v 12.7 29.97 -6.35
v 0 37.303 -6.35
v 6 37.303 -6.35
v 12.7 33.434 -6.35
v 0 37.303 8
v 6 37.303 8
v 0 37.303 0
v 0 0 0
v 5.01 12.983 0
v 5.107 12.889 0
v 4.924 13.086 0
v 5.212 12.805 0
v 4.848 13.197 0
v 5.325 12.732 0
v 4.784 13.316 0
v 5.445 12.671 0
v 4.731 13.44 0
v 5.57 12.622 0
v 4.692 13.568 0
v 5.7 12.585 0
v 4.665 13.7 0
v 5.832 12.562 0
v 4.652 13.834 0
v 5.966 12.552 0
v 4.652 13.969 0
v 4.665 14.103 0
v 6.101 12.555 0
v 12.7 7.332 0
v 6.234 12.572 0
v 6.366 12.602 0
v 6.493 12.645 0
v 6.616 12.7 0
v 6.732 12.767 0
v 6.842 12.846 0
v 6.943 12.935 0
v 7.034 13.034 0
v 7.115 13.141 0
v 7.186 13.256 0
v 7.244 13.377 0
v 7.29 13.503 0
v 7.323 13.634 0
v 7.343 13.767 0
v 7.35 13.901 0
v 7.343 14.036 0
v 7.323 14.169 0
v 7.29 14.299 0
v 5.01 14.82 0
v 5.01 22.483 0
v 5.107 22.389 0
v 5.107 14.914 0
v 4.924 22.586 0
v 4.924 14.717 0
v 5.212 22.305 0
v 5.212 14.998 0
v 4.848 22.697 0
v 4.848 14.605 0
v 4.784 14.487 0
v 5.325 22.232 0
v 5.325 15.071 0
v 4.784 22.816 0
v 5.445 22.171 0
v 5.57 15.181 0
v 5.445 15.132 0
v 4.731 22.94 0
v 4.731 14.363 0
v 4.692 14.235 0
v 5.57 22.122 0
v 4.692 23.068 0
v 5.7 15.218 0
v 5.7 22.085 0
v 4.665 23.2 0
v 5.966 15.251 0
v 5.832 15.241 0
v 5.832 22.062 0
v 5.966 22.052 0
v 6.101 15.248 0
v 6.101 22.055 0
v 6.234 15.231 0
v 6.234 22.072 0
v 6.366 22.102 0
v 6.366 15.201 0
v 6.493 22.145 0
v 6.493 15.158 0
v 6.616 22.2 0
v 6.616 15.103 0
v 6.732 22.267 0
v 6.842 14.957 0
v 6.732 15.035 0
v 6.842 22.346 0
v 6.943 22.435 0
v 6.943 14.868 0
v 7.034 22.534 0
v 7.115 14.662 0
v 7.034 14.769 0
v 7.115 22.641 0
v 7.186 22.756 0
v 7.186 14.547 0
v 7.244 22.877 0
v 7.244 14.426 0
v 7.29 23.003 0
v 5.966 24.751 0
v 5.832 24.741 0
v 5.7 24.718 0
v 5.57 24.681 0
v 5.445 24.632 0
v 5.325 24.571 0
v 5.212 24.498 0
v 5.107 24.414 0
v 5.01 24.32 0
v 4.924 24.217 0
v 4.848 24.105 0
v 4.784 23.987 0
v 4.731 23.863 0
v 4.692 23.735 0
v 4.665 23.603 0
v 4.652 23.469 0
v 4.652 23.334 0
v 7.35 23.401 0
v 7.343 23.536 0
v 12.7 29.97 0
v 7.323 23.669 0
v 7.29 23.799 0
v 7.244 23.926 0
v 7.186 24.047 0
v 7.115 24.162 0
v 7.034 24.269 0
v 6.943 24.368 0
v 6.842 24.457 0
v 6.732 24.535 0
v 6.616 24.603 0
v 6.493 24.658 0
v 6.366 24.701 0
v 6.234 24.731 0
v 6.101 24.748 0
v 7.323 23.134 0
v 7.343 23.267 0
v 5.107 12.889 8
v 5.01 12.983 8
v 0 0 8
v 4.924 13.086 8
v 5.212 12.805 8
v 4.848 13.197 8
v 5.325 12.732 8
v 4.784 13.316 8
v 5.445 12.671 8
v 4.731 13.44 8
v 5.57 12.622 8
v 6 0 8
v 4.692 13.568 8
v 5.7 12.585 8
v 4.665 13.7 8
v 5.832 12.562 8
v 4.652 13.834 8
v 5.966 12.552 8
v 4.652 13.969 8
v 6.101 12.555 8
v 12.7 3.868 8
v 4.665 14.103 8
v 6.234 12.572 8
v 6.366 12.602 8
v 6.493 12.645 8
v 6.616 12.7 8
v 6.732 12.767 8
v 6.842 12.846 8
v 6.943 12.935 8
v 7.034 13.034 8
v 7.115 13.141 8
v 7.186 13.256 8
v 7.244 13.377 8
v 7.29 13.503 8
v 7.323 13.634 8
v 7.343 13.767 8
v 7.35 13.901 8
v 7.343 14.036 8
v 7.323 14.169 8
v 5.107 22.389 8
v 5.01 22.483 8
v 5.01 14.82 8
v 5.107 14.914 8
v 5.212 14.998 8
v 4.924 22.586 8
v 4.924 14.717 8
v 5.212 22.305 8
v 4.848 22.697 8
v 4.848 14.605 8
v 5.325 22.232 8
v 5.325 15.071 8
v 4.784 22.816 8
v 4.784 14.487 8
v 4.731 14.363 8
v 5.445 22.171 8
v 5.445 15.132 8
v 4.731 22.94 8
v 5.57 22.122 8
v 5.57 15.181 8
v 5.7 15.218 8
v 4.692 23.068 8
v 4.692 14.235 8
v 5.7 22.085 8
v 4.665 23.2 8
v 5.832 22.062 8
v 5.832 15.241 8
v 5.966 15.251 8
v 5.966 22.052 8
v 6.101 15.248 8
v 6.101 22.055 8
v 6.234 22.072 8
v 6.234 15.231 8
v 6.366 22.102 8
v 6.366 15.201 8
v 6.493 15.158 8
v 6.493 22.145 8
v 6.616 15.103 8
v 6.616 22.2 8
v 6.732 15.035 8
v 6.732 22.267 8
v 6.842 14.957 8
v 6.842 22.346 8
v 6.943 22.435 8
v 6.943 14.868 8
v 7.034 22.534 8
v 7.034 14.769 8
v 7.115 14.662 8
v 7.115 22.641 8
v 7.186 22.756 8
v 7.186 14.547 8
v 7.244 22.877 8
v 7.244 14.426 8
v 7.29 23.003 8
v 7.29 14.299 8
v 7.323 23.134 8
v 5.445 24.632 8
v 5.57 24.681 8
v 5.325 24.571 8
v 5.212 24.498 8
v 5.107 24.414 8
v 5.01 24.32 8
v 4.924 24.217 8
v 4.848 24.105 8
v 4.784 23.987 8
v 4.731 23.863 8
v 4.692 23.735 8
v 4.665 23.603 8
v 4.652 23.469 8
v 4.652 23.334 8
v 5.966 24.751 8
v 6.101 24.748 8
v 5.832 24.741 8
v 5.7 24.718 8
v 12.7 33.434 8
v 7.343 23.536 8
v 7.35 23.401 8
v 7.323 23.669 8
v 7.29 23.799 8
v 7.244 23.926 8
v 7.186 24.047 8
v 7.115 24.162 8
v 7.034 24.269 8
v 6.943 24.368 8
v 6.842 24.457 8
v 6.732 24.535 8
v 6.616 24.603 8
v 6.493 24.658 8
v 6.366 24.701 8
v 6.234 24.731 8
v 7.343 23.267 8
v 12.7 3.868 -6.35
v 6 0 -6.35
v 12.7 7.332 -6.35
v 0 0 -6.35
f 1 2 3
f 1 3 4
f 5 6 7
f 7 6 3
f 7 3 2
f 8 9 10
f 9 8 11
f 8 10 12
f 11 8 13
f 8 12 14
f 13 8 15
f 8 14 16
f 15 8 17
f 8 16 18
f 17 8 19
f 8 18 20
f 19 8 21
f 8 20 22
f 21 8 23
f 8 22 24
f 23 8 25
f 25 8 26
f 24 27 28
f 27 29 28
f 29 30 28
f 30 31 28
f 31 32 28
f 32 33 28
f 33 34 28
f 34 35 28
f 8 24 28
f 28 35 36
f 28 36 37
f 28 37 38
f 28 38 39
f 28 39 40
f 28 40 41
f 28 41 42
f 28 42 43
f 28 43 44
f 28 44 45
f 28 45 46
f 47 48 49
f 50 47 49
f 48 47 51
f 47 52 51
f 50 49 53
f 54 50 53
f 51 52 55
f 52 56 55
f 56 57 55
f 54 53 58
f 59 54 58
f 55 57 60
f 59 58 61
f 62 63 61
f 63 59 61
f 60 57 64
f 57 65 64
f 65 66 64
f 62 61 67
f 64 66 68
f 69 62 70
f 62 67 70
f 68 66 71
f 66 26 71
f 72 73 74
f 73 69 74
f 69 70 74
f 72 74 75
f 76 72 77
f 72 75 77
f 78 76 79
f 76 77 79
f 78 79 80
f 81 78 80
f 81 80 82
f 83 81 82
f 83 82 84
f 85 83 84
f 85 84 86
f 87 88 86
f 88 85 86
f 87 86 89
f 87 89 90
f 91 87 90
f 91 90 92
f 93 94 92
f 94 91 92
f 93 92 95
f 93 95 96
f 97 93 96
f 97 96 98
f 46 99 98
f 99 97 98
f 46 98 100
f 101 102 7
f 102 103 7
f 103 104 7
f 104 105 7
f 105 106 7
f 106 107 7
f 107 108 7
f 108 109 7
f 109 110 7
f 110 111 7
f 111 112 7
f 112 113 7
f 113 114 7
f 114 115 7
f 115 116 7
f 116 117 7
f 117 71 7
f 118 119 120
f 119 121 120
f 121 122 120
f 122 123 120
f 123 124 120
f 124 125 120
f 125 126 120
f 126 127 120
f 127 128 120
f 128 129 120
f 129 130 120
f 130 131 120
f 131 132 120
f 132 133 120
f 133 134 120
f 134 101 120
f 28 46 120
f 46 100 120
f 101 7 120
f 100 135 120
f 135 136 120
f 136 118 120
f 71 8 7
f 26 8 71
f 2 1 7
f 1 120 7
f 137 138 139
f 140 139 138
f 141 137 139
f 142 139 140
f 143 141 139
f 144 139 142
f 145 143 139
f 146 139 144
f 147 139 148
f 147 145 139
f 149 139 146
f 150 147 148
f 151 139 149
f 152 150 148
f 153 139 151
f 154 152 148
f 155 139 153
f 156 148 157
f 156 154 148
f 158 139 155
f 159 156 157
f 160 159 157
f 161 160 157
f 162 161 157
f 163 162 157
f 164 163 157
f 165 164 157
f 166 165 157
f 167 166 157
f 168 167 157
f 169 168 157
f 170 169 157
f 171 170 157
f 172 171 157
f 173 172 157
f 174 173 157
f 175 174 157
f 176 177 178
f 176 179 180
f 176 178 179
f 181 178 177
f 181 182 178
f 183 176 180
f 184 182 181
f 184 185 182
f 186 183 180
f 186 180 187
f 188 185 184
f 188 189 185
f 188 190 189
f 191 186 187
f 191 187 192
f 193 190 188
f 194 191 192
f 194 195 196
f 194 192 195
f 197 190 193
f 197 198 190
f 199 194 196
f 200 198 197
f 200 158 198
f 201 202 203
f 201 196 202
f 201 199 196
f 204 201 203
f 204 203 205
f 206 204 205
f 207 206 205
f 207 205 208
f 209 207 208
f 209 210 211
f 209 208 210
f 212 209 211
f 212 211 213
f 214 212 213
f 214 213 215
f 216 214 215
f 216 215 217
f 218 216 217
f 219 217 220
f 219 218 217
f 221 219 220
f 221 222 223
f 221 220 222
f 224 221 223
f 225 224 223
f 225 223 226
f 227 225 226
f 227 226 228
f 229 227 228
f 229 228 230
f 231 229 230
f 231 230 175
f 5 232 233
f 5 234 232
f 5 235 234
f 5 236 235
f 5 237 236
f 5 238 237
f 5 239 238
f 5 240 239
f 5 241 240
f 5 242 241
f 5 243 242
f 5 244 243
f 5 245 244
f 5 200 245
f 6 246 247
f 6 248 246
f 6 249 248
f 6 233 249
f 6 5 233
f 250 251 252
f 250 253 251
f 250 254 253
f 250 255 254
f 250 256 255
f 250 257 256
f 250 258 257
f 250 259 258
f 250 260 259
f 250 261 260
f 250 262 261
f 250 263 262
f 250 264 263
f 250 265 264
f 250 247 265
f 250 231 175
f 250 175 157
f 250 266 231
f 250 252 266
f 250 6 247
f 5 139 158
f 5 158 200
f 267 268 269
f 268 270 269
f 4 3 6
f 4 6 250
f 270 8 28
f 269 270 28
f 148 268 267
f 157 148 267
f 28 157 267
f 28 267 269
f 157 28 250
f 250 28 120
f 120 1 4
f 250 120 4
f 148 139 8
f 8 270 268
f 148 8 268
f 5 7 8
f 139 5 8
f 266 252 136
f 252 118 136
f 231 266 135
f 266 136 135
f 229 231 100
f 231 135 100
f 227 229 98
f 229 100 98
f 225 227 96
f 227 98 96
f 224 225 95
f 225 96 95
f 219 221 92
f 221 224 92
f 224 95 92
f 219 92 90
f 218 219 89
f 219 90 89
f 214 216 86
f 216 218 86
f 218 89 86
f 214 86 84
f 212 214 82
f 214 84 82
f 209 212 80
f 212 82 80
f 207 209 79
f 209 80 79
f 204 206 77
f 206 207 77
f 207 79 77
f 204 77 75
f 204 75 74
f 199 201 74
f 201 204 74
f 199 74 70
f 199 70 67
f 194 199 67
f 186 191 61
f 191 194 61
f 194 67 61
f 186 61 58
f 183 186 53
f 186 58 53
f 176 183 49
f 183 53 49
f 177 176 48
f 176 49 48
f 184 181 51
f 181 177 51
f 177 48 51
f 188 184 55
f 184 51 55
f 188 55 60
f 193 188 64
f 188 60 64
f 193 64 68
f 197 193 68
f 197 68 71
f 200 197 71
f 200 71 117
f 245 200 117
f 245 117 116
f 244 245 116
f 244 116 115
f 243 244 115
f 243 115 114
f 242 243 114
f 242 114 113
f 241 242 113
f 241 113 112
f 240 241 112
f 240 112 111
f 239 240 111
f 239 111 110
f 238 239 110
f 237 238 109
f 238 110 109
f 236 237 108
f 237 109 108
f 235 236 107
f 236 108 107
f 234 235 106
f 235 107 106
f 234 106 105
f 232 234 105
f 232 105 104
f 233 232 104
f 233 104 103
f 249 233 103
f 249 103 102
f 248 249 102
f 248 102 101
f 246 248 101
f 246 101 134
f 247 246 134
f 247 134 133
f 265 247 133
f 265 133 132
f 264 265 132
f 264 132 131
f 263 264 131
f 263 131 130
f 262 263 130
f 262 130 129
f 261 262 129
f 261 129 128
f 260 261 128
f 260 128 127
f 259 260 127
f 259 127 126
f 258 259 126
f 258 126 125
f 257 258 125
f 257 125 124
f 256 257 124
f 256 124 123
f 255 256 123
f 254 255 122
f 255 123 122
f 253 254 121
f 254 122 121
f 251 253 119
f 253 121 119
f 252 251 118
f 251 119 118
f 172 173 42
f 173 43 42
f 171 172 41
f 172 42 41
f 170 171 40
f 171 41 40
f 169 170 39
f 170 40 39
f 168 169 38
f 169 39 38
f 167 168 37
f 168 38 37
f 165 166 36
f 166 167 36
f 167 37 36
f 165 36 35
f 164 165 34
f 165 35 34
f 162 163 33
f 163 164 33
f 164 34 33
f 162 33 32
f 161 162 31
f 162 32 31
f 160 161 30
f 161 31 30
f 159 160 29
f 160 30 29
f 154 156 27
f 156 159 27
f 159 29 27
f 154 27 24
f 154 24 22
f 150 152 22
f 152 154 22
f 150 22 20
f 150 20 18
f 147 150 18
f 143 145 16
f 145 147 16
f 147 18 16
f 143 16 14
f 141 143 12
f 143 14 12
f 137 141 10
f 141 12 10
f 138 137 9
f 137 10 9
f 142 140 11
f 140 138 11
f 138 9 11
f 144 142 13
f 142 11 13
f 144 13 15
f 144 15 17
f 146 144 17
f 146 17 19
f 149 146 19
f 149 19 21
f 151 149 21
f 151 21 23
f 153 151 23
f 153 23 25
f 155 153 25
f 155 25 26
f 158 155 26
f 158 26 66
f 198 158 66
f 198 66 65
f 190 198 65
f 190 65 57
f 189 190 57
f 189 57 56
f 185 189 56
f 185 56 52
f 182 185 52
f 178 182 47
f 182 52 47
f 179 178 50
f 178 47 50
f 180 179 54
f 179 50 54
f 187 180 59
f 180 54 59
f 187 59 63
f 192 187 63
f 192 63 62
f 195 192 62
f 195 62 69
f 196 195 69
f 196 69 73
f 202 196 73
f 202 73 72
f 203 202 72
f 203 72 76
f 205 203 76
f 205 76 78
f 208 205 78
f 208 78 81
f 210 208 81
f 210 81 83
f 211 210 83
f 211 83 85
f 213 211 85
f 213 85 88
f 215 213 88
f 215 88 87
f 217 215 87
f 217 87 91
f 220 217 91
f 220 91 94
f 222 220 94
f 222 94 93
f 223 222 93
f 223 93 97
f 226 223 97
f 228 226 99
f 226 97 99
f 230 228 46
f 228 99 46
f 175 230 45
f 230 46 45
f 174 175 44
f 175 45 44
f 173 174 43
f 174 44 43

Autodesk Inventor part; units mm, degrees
ref_plane "YZ Plane" through (0, 0, 0) normal (1, 0, 0) x (0, 1, 0)
ref_plane "XZ Plane" through (0, 0, 0) normal (0, 1, 0) x (-1, 0, 0)
ref_plane "XY Plane" through (0, 0, 0) normal (0, 0, 1) x (1, 0, 0)
sketch "Sketch1" plane through (0, 0, 0) normal (0, 0, 1) x (1, 0, 0)
  line L0 (12.7, 0) -> (12.7, 5.5)
  line L1 (0, 0) -> (12.7, 0)
  line L2 (12.7, 0) -> (12.7, 37.3027)
  line L3 (12.7, 37.3027) -> (0, 37.3027)
  line L4 (0, 37.3027) -> (0, 0)
  line L5 (6, 37.3027) -> (12.7, 33.4345)
  line L6 (6, 0) -> (12.7, 3.8682)
  circle A0 centre (6, 13.9014) radius 1.35
  circle A1 centre (6, 23.4014) radius 1.35
  line L7 (6, 23.4014) -> (6, 13.9014) construction
  line L8 (0, 0) -> (12.7, 7.3323)
  line L9 (12.7, 29.9704) -> (0, 37.3027)
  point P0 (6, 18.6514)
  point P1 (12.7, 18.6514)
  point P2 (12.7, 0)
  dimension "d2" = 9.5
  dimension "d3" = 2.7
  dimension "d4" = 2.7
  dimension "d15" = 37.3027
  dimension "d17" = 60
  dimension "d18" = 60
  dimension "d19" = 3
  dimension "d20" = 3
  dimension "d21" = 12.7
extrude "Extrusion1" add sketch "Sketch1" along normal blind 8 contours L6 L1 L8 L2 L0 | L4 L9 L2 L8 | L3 L5 L2 L9
extrude "Extrusion2" add sketch "Sketch1" against normal blind 6.35 and the other way blind 6 contours L6 L1 L8 L2 L0 | L3 L5 L2 L9
equation "\"d4\" = d3"
properties part number "Home Switch Mount X"
